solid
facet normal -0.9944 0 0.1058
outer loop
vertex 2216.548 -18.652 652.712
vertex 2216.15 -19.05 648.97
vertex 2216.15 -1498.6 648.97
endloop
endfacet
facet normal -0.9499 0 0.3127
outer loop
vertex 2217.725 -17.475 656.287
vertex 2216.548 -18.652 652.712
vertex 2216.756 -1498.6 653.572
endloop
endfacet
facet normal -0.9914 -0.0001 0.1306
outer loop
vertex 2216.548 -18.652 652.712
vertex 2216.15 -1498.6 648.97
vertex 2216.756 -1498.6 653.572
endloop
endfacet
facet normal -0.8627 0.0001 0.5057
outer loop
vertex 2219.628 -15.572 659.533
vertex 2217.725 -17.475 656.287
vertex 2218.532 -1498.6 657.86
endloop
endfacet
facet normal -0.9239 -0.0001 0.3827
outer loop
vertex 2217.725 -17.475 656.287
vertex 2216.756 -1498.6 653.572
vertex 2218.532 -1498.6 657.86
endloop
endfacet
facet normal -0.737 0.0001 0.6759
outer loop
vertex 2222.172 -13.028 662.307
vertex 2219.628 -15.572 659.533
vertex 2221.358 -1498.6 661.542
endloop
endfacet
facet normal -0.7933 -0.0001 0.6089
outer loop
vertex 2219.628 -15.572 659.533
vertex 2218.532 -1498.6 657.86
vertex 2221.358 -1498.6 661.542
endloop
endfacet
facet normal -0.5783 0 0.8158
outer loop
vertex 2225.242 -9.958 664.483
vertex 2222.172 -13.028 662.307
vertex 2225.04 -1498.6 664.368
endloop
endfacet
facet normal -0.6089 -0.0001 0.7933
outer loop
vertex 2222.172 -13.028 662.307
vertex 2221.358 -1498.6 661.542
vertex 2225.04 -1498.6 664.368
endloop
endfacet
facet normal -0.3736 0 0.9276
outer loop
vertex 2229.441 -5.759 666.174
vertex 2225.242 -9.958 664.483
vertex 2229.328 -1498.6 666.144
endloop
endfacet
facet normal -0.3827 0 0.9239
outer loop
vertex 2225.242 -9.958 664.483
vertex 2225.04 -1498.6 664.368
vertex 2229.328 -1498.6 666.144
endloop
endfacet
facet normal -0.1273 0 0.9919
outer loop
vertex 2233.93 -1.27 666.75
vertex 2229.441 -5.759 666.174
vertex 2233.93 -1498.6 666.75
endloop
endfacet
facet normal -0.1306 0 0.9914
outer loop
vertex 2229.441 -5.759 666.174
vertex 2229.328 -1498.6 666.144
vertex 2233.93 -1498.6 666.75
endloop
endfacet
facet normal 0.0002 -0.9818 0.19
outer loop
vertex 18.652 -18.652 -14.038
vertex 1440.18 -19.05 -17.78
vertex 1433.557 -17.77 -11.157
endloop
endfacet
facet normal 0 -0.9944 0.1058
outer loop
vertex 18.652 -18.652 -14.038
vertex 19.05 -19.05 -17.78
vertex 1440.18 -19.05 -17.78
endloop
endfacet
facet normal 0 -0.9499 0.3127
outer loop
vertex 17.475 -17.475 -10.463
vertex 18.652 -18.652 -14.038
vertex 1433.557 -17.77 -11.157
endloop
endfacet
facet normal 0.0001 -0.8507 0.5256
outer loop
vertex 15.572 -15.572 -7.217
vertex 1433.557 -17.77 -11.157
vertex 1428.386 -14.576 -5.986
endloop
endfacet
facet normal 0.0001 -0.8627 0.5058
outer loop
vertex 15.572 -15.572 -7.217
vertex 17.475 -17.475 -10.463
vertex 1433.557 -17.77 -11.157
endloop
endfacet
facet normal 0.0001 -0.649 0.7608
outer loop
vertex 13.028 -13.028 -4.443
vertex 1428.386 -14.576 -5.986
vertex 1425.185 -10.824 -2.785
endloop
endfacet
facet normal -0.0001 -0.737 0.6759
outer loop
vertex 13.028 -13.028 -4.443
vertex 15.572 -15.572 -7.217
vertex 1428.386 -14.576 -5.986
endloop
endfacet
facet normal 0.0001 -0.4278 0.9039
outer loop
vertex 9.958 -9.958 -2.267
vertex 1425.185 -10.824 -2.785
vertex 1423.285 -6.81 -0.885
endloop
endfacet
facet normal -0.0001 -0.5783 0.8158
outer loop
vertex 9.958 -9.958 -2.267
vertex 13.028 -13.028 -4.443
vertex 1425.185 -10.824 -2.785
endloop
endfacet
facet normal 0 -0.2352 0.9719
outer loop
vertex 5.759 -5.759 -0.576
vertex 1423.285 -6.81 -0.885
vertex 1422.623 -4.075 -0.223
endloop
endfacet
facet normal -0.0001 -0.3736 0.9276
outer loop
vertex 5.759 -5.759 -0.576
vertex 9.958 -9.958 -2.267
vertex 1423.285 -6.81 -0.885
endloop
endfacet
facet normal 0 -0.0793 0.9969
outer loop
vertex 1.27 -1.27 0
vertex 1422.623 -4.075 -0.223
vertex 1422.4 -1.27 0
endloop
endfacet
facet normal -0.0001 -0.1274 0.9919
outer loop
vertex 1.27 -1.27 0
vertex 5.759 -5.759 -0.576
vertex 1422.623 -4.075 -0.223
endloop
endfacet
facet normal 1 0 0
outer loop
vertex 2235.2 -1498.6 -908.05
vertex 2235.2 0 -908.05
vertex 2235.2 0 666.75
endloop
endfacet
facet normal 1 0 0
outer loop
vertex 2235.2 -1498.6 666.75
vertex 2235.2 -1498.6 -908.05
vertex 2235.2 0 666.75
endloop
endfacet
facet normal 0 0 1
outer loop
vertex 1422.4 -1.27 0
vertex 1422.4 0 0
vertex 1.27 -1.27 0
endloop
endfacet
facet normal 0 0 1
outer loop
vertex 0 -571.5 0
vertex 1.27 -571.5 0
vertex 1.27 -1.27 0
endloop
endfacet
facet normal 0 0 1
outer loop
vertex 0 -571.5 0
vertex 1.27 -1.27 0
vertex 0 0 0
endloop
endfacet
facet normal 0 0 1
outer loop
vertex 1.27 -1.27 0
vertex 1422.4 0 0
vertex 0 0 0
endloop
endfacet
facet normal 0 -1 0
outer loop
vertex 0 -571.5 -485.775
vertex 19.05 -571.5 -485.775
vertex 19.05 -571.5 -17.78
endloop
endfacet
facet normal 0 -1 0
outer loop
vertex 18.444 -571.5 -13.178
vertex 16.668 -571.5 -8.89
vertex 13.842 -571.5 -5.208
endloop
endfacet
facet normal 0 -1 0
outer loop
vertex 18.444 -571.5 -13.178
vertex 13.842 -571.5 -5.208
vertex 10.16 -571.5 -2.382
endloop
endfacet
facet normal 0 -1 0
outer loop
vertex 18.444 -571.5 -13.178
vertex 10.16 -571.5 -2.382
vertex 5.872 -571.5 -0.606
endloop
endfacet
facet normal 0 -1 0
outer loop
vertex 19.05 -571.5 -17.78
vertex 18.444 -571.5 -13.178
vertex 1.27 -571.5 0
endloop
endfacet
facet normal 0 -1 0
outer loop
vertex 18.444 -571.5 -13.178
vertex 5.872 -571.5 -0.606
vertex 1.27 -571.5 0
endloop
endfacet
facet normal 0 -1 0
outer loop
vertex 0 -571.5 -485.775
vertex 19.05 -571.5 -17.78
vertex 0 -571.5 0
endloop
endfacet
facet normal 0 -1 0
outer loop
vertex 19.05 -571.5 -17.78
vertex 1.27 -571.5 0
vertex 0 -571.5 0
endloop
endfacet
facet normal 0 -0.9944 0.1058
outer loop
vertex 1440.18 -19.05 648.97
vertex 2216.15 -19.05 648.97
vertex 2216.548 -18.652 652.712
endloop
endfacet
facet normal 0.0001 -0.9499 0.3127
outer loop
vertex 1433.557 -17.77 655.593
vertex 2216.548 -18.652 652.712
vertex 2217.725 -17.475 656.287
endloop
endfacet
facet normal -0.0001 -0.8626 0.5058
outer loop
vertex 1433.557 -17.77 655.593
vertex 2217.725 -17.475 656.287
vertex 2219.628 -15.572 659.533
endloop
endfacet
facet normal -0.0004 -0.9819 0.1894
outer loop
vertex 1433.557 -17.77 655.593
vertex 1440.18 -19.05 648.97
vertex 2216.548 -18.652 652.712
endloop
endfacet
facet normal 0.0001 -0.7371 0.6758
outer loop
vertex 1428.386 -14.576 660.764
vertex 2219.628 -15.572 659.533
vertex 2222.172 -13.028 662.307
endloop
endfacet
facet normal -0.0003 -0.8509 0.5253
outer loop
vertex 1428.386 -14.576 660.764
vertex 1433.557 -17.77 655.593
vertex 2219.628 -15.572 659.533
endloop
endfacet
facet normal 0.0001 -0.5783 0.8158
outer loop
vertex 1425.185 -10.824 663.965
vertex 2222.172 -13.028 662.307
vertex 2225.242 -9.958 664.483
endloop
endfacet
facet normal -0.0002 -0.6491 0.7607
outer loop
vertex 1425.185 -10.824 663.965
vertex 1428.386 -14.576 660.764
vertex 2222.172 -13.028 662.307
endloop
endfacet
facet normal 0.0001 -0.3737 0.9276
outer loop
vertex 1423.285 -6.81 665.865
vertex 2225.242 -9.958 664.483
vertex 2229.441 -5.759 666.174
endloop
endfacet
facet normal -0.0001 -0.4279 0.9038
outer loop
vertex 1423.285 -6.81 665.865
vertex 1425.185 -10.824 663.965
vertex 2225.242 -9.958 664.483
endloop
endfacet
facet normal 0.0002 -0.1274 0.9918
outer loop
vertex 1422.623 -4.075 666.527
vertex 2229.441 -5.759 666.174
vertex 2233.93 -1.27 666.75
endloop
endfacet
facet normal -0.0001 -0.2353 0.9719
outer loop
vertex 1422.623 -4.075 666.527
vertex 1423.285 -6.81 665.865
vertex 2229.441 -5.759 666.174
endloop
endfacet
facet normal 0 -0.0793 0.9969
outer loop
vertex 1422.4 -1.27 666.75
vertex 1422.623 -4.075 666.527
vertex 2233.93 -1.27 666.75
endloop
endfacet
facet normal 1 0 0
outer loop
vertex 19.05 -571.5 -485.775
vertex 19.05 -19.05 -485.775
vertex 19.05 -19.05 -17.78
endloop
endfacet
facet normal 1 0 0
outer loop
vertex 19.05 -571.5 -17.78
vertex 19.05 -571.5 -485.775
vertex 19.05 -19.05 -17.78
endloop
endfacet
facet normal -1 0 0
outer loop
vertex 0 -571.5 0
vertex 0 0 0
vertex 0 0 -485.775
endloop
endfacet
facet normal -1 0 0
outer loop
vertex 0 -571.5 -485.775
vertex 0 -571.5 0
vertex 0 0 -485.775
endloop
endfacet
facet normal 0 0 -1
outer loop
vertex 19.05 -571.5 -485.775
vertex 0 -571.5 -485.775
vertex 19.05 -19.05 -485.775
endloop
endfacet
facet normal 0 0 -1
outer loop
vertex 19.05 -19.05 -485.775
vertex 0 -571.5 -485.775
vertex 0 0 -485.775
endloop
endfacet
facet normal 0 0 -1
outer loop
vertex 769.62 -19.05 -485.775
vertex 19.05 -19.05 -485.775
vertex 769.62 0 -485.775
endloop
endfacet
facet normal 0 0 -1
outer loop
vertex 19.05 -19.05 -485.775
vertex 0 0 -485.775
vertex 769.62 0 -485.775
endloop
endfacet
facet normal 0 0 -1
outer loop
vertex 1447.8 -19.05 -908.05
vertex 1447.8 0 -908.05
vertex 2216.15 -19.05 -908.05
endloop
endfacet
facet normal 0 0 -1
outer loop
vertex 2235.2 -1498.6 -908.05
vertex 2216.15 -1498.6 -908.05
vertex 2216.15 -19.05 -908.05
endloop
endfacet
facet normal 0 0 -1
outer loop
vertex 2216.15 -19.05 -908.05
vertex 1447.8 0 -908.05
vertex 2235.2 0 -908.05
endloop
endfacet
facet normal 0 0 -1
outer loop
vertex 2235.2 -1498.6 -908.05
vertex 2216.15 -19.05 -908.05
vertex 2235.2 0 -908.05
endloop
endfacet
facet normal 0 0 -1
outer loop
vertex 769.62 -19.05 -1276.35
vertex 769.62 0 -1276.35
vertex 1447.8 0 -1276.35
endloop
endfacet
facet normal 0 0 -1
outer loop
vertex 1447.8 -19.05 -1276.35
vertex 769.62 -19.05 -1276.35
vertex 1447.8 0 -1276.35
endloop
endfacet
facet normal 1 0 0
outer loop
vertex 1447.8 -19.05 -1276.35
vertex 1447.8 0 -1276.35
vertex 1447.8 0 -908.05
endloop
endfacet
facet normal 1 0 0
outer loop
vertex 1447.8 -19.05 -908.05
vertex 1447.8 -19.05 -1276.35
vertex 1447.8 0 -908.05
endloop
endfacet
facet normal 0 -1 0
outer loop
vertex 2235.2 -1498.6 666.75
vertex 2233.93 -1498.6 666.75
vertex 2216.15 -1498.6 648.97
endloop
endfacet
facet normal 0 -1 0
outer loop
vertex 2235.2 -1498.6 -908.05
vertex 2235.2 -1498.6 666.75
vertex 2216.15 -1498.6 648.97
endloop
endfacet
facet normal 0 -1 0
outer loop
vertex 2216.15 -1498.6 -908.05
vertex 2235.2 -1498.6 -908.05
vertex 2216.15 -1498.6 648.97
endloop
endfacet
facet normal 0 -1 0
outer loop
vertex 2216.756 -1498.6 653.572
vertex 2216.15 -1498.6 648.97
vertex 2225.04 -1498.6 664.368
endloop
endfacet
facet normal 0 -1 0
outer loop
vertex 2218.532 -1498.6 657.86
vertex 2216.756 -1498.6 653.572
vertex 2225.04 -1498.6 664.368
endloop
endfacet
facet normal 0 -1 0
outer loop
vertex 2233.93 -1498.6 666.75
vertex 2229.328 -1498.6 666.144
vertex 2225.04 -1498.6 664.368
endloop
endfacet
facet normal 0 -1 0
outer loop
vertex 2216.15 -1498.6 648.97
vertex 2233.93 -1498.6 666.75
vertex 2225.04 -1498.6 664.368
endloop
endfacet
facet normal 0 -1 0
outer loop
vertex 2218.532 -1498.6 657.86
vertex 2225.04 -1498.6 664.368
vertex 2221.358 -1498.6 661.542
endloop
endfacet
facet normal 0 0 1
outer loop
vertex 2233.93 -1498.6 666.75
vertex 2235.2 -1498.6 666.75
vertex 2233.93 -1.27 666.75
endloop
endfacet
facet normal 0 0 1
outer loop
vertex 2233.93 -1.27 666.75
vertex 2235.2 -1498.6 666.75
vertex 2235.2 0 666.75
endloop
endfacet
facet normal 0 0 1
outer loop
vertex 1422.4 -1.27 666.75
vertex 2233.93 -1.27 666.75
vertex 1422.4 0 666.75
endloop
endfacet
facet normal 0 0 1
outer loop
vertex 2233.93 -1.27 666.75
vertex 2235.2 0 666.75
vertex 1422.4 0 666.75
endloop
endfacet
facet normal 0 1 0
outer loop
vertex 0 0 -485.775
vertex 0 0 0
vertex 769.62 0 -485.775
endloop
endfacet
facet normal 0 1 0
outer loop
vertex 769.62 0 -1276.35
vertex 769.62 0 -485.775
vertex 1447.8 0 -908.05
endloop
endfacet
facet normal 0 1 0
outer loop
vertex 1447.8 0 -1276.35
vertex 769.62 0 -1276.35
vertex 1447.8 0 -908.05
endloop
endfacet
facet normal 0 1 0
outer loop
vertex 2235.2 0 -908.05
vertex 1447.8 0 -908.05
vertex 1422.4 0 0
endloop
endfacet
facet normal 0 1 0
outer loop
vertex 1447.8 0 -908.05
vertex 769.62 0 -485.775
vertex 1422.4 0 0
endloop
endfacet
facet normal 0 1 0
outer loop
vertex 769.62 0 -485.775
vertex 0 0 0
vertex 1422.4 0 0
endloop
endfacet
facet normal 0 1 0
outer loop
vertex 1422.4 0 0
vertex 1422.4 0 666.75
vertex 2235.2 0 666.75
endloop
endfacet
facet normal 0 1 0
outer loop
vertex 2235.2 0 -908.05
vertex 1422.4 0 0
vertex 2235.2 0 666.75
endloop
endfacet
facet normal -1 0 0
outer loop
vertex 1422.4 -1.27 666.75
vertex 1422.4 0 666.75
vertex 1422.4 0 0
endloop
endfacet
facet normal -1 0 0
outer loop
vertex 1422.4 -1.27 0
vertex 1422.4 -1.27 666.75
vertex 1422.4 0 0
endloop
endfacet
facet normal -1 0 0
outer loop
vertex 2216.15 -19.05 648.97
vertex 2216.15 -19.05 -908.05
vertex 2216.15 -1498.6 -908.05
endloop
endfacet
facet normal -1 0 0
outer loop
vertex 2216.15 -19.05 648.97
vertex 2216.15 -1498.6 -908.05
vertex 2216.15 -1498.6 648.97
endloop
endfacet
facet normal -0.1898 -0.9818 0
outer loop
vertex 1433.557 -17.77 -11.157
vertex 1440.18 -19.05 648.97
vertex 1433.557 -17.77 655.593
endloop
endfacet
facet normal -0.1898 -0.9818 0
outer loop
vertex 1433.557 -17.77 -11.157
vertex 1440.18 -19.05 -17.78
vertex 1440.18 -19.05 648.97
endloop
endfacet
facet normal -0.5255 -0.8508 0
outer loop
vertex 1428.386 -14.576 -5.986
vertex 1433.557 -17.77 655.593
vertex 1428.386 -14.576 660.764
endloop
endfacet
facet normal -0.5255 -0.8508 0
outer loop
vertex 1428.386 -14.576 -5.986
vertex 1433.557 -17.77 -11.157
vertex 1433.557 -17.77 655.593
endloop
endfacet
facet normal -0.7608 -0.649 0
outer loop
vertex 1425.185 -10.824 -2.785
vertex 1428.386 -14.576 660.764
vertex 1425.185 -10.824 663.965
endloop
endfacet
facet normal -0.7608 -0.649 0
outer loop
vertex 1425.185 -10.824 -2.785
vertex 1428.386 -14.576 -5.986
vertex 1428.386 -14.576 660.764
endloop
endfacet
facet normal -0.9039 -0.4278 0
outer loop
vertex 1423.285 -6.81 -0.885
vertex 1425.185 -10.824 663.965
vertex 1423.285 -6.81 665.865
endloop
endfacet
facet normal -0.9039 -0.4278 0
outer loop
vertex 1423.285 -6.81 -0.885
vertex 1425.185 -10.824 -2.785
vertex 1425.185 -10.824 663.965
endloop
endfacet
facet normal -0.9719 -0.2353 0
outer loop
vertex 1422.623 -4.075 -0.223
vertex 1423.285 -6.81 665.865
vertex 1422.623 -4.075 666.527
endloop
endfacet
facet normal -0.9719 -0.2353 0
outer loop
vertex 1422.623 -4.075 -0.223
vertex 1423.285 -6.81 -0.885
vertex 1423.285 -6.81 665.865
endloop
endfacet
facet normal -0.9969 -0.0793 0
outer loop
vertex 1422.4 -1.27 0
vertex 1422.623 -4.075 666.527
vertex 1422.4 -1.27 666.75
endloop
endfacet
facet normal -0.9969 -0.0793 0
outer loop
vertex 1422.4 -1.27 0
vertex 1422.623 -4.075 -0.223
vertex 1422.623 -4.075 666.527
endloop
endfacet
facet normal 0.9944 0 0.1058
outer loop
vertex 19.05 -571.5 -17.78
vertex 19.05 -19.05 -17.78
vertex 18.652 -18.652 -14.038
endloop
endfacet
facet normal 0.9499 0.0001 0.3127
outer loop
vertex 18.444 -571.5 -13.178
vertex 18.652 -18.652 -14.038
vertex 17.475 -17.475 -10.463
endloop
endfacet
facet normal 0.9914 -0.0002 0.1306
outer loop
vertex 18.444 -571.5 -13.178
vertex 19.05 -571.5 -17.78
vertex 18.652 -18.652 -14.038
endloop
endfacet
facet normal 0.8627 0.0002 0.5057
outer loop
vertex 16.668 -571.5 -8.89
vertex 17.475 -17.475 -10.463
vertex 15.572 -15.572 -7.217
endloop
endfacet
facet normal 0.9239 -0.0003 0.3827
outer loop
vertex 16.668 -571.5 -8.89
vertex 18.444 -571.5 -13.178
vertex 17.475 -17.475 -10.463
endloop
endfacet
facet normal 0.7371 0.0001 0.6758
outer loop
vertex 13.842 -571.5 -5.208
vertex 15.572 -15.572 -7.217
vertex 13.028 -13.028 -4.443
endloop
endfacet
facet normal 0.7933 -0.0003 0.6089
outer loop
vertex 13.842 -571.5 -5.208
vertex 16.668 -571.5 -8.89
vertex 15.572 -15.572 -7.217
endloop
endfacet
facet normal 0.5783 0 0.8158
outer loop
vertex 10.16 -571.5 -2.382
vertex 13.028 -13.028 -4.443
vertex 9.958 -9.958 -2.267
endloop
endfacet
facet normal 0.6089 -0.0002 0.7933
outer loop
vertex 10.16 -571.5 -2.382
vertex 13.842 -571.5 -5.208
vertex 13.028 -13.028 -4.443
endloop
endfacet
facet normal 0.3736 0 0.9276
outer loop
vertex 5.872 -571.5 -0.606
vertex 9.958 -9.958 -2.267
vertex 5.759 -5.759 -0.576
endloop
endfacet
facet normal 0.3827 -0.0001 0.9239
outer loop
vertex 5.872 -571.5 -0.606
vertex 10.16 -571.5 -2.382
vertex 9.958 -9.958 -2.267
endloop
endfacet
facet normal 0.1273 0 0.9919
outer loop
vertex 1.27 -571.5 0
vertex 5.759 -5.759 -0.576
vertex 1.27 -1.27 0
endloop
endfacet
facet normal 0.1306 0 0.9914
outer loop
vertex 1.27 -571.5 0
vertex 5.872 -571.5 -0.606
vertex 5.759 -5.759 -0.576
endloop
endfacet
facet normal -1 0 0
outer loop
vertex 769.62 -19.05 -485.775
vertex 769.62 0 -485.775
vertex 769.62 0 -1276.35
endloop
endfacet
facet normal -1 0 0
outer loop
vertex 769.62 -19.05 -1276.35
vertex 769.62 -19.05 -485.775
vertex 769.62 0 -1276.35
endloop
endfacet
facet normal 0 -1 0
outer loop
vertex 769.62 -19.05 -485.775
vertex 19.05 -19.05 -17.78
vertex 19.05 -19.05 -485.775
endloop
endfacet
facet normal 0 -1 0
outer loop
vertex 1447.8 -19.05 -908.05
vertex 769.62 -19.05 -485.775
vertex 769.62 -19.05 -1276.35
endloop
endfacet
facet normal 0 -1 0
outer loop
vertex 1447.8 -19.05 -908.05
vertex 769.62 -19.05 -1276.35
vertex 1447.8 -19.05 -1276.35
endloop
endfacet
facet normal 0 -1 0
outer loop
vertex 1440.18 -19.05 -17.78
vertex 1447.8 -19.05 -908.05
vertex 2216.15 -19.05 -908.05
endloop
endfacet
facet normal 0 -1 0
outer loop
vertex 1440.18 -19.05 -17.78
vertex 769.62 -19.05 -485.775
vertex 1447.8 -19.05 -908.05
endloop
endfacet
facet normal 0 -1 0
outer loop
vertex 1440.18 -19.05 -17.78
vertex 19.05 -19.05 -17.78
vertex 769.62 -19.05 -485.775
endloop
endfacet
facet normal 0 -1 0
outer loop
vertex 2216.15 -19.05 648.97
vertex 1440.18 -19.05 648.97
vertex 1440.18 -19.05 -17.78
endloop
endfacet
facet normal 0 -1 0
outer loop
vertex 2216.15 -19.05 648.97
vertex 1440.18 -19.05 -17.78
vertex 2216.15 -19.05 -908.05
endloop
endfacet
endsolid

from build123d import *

# Parameters (mm, degrees)
F0_W     = 787.4
F0_H     = 422.275
F1_DEPTH = 19.05
F2_W     = 19.05
F2_H     = 485.775
F3_DEPTH = 571.5
F4_W     = 19.05
F4_H     = 1574.8
F5_DEPTH = 1498.6
F6_R     = 17.78


with BuildPart() as f1:
    # F0 (on Front) → F1 (new body)
    with BuildSketch(Plane.XZ):
        Polygon((1422.4, 0), (0, 0), (0, -485.775), (769.62, -485.775), (1422.4, -485.775), align=None)
        Polygon((1447.8, -485.775), (1422.4, -485.775), (769.62, -485.775), (769.62, -1276.35), (1447.8, -1276.35), (1447.8, -908.05), align=None)
        with Locations((1841.5, -696.9125)):
            Rectangle(F0_W, F0_H)
        Polygon((1422.4, 666.75), (1422.4, 0), (1422.4, -485.775), (1447.8, -485.775), (2235.2, -485.775), (2235.2, 666.75), align=None)
    extrude(amount=F1_DEPTH)

    # F2 (on face) → F3 (join)
    with BuildSketch(Plane(origin=(0, 0, 0), x_dir=(-1, 0, 0), z_dir=(0, 1, 0))):
        with Locations((-9.525, -242.8875)):
            Rectangle(F2_W, F2_H)
    extrude(amount=-F3_DEPTH)

    # F4 (on face) → F5 (join)
    with BuildSketch(Plane(origin=(0, 0, 0), x_dir=(-1, 0, 0), z_dir=(0, 1, 0))):
        with Locations((-2225.675, -120.65)):
            Rectangle(F4_W, F4_H)
    extrude(amount=-F5_DEPTH)

    # F6
    f6_edges = [f1.edges().sort_by_distance(p)[0] for p in [
        (720.725, -19.05, 0),
        (1422.4, -19.05, 333.375),
        (1819.275, -19.05, 666.75),
        (19.05, -295.275, 0),
        (2216.15, -758.825, 666.75),
    ]]
    fillet(f6_edges, radius=F6_R)


solid = f1.part
